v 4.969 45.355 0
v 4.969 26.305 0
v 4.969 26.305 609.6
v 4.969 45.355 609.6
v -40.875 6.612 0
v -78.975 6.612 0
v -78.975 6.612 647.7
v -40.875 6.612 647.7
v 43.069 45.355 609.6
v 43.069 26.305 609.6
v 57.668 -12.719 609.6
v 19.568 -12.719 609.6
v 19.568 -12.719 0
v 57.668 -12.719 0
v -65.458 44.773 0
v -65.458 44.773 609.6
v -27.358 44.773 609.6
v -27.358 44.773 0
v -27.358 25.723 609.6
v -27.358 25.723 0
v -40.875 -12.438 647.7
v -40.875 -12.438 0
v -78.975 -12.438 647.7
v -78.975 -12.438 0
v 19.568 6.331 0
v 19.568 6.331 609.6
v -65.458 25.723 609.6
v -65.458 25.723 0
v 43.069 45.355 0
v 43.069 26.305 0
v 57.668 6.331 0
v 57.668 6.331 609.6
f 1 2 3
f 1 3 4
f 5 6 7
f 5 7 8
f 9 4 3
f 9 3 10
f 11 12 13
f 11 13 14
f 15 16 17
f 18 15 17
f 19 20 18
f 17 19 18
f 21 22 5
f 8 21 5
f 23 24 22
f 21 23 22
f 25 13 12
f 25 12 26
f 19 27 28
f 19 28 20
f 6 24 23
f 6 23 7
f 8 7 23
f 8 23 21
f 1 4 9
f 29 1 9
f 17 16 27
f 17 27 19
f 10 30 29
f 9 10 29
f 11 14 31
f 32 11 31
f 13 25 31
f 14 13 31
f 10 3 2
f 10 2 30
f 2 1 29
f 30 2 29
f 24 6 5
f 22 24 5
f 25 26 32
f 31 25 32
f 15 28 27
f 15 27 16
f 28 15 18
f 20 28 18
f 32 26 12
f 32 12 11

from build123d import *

# Parameters (mm, degrees)
F0_W     = 38.1
F0_H     = 19.05
F1_DEPTH = 609.6
F2_DEPTH = 609.6
F3_DEPTH = 647.7
F4_DEPTH = 609.6


with BuildPart() as f1:
    # F0 (on Top) → F1 (new body)
    with BuildSketch(Plane.XY):
        with Locations((-46.408225, 35.248306)):
            Rectangle(F0_W, F0_H)
    extrude(amount=F1_DEPTH)


with BuildPart() as f2:
    # F0 (on Top) → F2 (new body)
    with BuildSketch(Plane.XY):
        with Locations((24.019392, 35.830379)):
            Rectangle(F0_W, F0_H)
    extrude(amount=F2_DEPTH)


with BuildPart() as f3:
    # F0 (on Top) → F3 (new body)
    with BuildSketch(Plane.XY):
        with Locations((-59.925463, -2.9134)):
            Rectangle(F0_W, F0_H)
    extrude(amount=F3_DEPTH)


with BuildPart() as f4:
    # F0 (on Top) → F4 (new body)
    with BuildSketch(Plane.XY):
        with Locations((38.618498, -3.194152)):
            Rectangle(F0_W, F0_H)
    extrude(amount=F4_DEPTH)


solid = Compound([f1.part, f2.part, f3.part, f4.part])
